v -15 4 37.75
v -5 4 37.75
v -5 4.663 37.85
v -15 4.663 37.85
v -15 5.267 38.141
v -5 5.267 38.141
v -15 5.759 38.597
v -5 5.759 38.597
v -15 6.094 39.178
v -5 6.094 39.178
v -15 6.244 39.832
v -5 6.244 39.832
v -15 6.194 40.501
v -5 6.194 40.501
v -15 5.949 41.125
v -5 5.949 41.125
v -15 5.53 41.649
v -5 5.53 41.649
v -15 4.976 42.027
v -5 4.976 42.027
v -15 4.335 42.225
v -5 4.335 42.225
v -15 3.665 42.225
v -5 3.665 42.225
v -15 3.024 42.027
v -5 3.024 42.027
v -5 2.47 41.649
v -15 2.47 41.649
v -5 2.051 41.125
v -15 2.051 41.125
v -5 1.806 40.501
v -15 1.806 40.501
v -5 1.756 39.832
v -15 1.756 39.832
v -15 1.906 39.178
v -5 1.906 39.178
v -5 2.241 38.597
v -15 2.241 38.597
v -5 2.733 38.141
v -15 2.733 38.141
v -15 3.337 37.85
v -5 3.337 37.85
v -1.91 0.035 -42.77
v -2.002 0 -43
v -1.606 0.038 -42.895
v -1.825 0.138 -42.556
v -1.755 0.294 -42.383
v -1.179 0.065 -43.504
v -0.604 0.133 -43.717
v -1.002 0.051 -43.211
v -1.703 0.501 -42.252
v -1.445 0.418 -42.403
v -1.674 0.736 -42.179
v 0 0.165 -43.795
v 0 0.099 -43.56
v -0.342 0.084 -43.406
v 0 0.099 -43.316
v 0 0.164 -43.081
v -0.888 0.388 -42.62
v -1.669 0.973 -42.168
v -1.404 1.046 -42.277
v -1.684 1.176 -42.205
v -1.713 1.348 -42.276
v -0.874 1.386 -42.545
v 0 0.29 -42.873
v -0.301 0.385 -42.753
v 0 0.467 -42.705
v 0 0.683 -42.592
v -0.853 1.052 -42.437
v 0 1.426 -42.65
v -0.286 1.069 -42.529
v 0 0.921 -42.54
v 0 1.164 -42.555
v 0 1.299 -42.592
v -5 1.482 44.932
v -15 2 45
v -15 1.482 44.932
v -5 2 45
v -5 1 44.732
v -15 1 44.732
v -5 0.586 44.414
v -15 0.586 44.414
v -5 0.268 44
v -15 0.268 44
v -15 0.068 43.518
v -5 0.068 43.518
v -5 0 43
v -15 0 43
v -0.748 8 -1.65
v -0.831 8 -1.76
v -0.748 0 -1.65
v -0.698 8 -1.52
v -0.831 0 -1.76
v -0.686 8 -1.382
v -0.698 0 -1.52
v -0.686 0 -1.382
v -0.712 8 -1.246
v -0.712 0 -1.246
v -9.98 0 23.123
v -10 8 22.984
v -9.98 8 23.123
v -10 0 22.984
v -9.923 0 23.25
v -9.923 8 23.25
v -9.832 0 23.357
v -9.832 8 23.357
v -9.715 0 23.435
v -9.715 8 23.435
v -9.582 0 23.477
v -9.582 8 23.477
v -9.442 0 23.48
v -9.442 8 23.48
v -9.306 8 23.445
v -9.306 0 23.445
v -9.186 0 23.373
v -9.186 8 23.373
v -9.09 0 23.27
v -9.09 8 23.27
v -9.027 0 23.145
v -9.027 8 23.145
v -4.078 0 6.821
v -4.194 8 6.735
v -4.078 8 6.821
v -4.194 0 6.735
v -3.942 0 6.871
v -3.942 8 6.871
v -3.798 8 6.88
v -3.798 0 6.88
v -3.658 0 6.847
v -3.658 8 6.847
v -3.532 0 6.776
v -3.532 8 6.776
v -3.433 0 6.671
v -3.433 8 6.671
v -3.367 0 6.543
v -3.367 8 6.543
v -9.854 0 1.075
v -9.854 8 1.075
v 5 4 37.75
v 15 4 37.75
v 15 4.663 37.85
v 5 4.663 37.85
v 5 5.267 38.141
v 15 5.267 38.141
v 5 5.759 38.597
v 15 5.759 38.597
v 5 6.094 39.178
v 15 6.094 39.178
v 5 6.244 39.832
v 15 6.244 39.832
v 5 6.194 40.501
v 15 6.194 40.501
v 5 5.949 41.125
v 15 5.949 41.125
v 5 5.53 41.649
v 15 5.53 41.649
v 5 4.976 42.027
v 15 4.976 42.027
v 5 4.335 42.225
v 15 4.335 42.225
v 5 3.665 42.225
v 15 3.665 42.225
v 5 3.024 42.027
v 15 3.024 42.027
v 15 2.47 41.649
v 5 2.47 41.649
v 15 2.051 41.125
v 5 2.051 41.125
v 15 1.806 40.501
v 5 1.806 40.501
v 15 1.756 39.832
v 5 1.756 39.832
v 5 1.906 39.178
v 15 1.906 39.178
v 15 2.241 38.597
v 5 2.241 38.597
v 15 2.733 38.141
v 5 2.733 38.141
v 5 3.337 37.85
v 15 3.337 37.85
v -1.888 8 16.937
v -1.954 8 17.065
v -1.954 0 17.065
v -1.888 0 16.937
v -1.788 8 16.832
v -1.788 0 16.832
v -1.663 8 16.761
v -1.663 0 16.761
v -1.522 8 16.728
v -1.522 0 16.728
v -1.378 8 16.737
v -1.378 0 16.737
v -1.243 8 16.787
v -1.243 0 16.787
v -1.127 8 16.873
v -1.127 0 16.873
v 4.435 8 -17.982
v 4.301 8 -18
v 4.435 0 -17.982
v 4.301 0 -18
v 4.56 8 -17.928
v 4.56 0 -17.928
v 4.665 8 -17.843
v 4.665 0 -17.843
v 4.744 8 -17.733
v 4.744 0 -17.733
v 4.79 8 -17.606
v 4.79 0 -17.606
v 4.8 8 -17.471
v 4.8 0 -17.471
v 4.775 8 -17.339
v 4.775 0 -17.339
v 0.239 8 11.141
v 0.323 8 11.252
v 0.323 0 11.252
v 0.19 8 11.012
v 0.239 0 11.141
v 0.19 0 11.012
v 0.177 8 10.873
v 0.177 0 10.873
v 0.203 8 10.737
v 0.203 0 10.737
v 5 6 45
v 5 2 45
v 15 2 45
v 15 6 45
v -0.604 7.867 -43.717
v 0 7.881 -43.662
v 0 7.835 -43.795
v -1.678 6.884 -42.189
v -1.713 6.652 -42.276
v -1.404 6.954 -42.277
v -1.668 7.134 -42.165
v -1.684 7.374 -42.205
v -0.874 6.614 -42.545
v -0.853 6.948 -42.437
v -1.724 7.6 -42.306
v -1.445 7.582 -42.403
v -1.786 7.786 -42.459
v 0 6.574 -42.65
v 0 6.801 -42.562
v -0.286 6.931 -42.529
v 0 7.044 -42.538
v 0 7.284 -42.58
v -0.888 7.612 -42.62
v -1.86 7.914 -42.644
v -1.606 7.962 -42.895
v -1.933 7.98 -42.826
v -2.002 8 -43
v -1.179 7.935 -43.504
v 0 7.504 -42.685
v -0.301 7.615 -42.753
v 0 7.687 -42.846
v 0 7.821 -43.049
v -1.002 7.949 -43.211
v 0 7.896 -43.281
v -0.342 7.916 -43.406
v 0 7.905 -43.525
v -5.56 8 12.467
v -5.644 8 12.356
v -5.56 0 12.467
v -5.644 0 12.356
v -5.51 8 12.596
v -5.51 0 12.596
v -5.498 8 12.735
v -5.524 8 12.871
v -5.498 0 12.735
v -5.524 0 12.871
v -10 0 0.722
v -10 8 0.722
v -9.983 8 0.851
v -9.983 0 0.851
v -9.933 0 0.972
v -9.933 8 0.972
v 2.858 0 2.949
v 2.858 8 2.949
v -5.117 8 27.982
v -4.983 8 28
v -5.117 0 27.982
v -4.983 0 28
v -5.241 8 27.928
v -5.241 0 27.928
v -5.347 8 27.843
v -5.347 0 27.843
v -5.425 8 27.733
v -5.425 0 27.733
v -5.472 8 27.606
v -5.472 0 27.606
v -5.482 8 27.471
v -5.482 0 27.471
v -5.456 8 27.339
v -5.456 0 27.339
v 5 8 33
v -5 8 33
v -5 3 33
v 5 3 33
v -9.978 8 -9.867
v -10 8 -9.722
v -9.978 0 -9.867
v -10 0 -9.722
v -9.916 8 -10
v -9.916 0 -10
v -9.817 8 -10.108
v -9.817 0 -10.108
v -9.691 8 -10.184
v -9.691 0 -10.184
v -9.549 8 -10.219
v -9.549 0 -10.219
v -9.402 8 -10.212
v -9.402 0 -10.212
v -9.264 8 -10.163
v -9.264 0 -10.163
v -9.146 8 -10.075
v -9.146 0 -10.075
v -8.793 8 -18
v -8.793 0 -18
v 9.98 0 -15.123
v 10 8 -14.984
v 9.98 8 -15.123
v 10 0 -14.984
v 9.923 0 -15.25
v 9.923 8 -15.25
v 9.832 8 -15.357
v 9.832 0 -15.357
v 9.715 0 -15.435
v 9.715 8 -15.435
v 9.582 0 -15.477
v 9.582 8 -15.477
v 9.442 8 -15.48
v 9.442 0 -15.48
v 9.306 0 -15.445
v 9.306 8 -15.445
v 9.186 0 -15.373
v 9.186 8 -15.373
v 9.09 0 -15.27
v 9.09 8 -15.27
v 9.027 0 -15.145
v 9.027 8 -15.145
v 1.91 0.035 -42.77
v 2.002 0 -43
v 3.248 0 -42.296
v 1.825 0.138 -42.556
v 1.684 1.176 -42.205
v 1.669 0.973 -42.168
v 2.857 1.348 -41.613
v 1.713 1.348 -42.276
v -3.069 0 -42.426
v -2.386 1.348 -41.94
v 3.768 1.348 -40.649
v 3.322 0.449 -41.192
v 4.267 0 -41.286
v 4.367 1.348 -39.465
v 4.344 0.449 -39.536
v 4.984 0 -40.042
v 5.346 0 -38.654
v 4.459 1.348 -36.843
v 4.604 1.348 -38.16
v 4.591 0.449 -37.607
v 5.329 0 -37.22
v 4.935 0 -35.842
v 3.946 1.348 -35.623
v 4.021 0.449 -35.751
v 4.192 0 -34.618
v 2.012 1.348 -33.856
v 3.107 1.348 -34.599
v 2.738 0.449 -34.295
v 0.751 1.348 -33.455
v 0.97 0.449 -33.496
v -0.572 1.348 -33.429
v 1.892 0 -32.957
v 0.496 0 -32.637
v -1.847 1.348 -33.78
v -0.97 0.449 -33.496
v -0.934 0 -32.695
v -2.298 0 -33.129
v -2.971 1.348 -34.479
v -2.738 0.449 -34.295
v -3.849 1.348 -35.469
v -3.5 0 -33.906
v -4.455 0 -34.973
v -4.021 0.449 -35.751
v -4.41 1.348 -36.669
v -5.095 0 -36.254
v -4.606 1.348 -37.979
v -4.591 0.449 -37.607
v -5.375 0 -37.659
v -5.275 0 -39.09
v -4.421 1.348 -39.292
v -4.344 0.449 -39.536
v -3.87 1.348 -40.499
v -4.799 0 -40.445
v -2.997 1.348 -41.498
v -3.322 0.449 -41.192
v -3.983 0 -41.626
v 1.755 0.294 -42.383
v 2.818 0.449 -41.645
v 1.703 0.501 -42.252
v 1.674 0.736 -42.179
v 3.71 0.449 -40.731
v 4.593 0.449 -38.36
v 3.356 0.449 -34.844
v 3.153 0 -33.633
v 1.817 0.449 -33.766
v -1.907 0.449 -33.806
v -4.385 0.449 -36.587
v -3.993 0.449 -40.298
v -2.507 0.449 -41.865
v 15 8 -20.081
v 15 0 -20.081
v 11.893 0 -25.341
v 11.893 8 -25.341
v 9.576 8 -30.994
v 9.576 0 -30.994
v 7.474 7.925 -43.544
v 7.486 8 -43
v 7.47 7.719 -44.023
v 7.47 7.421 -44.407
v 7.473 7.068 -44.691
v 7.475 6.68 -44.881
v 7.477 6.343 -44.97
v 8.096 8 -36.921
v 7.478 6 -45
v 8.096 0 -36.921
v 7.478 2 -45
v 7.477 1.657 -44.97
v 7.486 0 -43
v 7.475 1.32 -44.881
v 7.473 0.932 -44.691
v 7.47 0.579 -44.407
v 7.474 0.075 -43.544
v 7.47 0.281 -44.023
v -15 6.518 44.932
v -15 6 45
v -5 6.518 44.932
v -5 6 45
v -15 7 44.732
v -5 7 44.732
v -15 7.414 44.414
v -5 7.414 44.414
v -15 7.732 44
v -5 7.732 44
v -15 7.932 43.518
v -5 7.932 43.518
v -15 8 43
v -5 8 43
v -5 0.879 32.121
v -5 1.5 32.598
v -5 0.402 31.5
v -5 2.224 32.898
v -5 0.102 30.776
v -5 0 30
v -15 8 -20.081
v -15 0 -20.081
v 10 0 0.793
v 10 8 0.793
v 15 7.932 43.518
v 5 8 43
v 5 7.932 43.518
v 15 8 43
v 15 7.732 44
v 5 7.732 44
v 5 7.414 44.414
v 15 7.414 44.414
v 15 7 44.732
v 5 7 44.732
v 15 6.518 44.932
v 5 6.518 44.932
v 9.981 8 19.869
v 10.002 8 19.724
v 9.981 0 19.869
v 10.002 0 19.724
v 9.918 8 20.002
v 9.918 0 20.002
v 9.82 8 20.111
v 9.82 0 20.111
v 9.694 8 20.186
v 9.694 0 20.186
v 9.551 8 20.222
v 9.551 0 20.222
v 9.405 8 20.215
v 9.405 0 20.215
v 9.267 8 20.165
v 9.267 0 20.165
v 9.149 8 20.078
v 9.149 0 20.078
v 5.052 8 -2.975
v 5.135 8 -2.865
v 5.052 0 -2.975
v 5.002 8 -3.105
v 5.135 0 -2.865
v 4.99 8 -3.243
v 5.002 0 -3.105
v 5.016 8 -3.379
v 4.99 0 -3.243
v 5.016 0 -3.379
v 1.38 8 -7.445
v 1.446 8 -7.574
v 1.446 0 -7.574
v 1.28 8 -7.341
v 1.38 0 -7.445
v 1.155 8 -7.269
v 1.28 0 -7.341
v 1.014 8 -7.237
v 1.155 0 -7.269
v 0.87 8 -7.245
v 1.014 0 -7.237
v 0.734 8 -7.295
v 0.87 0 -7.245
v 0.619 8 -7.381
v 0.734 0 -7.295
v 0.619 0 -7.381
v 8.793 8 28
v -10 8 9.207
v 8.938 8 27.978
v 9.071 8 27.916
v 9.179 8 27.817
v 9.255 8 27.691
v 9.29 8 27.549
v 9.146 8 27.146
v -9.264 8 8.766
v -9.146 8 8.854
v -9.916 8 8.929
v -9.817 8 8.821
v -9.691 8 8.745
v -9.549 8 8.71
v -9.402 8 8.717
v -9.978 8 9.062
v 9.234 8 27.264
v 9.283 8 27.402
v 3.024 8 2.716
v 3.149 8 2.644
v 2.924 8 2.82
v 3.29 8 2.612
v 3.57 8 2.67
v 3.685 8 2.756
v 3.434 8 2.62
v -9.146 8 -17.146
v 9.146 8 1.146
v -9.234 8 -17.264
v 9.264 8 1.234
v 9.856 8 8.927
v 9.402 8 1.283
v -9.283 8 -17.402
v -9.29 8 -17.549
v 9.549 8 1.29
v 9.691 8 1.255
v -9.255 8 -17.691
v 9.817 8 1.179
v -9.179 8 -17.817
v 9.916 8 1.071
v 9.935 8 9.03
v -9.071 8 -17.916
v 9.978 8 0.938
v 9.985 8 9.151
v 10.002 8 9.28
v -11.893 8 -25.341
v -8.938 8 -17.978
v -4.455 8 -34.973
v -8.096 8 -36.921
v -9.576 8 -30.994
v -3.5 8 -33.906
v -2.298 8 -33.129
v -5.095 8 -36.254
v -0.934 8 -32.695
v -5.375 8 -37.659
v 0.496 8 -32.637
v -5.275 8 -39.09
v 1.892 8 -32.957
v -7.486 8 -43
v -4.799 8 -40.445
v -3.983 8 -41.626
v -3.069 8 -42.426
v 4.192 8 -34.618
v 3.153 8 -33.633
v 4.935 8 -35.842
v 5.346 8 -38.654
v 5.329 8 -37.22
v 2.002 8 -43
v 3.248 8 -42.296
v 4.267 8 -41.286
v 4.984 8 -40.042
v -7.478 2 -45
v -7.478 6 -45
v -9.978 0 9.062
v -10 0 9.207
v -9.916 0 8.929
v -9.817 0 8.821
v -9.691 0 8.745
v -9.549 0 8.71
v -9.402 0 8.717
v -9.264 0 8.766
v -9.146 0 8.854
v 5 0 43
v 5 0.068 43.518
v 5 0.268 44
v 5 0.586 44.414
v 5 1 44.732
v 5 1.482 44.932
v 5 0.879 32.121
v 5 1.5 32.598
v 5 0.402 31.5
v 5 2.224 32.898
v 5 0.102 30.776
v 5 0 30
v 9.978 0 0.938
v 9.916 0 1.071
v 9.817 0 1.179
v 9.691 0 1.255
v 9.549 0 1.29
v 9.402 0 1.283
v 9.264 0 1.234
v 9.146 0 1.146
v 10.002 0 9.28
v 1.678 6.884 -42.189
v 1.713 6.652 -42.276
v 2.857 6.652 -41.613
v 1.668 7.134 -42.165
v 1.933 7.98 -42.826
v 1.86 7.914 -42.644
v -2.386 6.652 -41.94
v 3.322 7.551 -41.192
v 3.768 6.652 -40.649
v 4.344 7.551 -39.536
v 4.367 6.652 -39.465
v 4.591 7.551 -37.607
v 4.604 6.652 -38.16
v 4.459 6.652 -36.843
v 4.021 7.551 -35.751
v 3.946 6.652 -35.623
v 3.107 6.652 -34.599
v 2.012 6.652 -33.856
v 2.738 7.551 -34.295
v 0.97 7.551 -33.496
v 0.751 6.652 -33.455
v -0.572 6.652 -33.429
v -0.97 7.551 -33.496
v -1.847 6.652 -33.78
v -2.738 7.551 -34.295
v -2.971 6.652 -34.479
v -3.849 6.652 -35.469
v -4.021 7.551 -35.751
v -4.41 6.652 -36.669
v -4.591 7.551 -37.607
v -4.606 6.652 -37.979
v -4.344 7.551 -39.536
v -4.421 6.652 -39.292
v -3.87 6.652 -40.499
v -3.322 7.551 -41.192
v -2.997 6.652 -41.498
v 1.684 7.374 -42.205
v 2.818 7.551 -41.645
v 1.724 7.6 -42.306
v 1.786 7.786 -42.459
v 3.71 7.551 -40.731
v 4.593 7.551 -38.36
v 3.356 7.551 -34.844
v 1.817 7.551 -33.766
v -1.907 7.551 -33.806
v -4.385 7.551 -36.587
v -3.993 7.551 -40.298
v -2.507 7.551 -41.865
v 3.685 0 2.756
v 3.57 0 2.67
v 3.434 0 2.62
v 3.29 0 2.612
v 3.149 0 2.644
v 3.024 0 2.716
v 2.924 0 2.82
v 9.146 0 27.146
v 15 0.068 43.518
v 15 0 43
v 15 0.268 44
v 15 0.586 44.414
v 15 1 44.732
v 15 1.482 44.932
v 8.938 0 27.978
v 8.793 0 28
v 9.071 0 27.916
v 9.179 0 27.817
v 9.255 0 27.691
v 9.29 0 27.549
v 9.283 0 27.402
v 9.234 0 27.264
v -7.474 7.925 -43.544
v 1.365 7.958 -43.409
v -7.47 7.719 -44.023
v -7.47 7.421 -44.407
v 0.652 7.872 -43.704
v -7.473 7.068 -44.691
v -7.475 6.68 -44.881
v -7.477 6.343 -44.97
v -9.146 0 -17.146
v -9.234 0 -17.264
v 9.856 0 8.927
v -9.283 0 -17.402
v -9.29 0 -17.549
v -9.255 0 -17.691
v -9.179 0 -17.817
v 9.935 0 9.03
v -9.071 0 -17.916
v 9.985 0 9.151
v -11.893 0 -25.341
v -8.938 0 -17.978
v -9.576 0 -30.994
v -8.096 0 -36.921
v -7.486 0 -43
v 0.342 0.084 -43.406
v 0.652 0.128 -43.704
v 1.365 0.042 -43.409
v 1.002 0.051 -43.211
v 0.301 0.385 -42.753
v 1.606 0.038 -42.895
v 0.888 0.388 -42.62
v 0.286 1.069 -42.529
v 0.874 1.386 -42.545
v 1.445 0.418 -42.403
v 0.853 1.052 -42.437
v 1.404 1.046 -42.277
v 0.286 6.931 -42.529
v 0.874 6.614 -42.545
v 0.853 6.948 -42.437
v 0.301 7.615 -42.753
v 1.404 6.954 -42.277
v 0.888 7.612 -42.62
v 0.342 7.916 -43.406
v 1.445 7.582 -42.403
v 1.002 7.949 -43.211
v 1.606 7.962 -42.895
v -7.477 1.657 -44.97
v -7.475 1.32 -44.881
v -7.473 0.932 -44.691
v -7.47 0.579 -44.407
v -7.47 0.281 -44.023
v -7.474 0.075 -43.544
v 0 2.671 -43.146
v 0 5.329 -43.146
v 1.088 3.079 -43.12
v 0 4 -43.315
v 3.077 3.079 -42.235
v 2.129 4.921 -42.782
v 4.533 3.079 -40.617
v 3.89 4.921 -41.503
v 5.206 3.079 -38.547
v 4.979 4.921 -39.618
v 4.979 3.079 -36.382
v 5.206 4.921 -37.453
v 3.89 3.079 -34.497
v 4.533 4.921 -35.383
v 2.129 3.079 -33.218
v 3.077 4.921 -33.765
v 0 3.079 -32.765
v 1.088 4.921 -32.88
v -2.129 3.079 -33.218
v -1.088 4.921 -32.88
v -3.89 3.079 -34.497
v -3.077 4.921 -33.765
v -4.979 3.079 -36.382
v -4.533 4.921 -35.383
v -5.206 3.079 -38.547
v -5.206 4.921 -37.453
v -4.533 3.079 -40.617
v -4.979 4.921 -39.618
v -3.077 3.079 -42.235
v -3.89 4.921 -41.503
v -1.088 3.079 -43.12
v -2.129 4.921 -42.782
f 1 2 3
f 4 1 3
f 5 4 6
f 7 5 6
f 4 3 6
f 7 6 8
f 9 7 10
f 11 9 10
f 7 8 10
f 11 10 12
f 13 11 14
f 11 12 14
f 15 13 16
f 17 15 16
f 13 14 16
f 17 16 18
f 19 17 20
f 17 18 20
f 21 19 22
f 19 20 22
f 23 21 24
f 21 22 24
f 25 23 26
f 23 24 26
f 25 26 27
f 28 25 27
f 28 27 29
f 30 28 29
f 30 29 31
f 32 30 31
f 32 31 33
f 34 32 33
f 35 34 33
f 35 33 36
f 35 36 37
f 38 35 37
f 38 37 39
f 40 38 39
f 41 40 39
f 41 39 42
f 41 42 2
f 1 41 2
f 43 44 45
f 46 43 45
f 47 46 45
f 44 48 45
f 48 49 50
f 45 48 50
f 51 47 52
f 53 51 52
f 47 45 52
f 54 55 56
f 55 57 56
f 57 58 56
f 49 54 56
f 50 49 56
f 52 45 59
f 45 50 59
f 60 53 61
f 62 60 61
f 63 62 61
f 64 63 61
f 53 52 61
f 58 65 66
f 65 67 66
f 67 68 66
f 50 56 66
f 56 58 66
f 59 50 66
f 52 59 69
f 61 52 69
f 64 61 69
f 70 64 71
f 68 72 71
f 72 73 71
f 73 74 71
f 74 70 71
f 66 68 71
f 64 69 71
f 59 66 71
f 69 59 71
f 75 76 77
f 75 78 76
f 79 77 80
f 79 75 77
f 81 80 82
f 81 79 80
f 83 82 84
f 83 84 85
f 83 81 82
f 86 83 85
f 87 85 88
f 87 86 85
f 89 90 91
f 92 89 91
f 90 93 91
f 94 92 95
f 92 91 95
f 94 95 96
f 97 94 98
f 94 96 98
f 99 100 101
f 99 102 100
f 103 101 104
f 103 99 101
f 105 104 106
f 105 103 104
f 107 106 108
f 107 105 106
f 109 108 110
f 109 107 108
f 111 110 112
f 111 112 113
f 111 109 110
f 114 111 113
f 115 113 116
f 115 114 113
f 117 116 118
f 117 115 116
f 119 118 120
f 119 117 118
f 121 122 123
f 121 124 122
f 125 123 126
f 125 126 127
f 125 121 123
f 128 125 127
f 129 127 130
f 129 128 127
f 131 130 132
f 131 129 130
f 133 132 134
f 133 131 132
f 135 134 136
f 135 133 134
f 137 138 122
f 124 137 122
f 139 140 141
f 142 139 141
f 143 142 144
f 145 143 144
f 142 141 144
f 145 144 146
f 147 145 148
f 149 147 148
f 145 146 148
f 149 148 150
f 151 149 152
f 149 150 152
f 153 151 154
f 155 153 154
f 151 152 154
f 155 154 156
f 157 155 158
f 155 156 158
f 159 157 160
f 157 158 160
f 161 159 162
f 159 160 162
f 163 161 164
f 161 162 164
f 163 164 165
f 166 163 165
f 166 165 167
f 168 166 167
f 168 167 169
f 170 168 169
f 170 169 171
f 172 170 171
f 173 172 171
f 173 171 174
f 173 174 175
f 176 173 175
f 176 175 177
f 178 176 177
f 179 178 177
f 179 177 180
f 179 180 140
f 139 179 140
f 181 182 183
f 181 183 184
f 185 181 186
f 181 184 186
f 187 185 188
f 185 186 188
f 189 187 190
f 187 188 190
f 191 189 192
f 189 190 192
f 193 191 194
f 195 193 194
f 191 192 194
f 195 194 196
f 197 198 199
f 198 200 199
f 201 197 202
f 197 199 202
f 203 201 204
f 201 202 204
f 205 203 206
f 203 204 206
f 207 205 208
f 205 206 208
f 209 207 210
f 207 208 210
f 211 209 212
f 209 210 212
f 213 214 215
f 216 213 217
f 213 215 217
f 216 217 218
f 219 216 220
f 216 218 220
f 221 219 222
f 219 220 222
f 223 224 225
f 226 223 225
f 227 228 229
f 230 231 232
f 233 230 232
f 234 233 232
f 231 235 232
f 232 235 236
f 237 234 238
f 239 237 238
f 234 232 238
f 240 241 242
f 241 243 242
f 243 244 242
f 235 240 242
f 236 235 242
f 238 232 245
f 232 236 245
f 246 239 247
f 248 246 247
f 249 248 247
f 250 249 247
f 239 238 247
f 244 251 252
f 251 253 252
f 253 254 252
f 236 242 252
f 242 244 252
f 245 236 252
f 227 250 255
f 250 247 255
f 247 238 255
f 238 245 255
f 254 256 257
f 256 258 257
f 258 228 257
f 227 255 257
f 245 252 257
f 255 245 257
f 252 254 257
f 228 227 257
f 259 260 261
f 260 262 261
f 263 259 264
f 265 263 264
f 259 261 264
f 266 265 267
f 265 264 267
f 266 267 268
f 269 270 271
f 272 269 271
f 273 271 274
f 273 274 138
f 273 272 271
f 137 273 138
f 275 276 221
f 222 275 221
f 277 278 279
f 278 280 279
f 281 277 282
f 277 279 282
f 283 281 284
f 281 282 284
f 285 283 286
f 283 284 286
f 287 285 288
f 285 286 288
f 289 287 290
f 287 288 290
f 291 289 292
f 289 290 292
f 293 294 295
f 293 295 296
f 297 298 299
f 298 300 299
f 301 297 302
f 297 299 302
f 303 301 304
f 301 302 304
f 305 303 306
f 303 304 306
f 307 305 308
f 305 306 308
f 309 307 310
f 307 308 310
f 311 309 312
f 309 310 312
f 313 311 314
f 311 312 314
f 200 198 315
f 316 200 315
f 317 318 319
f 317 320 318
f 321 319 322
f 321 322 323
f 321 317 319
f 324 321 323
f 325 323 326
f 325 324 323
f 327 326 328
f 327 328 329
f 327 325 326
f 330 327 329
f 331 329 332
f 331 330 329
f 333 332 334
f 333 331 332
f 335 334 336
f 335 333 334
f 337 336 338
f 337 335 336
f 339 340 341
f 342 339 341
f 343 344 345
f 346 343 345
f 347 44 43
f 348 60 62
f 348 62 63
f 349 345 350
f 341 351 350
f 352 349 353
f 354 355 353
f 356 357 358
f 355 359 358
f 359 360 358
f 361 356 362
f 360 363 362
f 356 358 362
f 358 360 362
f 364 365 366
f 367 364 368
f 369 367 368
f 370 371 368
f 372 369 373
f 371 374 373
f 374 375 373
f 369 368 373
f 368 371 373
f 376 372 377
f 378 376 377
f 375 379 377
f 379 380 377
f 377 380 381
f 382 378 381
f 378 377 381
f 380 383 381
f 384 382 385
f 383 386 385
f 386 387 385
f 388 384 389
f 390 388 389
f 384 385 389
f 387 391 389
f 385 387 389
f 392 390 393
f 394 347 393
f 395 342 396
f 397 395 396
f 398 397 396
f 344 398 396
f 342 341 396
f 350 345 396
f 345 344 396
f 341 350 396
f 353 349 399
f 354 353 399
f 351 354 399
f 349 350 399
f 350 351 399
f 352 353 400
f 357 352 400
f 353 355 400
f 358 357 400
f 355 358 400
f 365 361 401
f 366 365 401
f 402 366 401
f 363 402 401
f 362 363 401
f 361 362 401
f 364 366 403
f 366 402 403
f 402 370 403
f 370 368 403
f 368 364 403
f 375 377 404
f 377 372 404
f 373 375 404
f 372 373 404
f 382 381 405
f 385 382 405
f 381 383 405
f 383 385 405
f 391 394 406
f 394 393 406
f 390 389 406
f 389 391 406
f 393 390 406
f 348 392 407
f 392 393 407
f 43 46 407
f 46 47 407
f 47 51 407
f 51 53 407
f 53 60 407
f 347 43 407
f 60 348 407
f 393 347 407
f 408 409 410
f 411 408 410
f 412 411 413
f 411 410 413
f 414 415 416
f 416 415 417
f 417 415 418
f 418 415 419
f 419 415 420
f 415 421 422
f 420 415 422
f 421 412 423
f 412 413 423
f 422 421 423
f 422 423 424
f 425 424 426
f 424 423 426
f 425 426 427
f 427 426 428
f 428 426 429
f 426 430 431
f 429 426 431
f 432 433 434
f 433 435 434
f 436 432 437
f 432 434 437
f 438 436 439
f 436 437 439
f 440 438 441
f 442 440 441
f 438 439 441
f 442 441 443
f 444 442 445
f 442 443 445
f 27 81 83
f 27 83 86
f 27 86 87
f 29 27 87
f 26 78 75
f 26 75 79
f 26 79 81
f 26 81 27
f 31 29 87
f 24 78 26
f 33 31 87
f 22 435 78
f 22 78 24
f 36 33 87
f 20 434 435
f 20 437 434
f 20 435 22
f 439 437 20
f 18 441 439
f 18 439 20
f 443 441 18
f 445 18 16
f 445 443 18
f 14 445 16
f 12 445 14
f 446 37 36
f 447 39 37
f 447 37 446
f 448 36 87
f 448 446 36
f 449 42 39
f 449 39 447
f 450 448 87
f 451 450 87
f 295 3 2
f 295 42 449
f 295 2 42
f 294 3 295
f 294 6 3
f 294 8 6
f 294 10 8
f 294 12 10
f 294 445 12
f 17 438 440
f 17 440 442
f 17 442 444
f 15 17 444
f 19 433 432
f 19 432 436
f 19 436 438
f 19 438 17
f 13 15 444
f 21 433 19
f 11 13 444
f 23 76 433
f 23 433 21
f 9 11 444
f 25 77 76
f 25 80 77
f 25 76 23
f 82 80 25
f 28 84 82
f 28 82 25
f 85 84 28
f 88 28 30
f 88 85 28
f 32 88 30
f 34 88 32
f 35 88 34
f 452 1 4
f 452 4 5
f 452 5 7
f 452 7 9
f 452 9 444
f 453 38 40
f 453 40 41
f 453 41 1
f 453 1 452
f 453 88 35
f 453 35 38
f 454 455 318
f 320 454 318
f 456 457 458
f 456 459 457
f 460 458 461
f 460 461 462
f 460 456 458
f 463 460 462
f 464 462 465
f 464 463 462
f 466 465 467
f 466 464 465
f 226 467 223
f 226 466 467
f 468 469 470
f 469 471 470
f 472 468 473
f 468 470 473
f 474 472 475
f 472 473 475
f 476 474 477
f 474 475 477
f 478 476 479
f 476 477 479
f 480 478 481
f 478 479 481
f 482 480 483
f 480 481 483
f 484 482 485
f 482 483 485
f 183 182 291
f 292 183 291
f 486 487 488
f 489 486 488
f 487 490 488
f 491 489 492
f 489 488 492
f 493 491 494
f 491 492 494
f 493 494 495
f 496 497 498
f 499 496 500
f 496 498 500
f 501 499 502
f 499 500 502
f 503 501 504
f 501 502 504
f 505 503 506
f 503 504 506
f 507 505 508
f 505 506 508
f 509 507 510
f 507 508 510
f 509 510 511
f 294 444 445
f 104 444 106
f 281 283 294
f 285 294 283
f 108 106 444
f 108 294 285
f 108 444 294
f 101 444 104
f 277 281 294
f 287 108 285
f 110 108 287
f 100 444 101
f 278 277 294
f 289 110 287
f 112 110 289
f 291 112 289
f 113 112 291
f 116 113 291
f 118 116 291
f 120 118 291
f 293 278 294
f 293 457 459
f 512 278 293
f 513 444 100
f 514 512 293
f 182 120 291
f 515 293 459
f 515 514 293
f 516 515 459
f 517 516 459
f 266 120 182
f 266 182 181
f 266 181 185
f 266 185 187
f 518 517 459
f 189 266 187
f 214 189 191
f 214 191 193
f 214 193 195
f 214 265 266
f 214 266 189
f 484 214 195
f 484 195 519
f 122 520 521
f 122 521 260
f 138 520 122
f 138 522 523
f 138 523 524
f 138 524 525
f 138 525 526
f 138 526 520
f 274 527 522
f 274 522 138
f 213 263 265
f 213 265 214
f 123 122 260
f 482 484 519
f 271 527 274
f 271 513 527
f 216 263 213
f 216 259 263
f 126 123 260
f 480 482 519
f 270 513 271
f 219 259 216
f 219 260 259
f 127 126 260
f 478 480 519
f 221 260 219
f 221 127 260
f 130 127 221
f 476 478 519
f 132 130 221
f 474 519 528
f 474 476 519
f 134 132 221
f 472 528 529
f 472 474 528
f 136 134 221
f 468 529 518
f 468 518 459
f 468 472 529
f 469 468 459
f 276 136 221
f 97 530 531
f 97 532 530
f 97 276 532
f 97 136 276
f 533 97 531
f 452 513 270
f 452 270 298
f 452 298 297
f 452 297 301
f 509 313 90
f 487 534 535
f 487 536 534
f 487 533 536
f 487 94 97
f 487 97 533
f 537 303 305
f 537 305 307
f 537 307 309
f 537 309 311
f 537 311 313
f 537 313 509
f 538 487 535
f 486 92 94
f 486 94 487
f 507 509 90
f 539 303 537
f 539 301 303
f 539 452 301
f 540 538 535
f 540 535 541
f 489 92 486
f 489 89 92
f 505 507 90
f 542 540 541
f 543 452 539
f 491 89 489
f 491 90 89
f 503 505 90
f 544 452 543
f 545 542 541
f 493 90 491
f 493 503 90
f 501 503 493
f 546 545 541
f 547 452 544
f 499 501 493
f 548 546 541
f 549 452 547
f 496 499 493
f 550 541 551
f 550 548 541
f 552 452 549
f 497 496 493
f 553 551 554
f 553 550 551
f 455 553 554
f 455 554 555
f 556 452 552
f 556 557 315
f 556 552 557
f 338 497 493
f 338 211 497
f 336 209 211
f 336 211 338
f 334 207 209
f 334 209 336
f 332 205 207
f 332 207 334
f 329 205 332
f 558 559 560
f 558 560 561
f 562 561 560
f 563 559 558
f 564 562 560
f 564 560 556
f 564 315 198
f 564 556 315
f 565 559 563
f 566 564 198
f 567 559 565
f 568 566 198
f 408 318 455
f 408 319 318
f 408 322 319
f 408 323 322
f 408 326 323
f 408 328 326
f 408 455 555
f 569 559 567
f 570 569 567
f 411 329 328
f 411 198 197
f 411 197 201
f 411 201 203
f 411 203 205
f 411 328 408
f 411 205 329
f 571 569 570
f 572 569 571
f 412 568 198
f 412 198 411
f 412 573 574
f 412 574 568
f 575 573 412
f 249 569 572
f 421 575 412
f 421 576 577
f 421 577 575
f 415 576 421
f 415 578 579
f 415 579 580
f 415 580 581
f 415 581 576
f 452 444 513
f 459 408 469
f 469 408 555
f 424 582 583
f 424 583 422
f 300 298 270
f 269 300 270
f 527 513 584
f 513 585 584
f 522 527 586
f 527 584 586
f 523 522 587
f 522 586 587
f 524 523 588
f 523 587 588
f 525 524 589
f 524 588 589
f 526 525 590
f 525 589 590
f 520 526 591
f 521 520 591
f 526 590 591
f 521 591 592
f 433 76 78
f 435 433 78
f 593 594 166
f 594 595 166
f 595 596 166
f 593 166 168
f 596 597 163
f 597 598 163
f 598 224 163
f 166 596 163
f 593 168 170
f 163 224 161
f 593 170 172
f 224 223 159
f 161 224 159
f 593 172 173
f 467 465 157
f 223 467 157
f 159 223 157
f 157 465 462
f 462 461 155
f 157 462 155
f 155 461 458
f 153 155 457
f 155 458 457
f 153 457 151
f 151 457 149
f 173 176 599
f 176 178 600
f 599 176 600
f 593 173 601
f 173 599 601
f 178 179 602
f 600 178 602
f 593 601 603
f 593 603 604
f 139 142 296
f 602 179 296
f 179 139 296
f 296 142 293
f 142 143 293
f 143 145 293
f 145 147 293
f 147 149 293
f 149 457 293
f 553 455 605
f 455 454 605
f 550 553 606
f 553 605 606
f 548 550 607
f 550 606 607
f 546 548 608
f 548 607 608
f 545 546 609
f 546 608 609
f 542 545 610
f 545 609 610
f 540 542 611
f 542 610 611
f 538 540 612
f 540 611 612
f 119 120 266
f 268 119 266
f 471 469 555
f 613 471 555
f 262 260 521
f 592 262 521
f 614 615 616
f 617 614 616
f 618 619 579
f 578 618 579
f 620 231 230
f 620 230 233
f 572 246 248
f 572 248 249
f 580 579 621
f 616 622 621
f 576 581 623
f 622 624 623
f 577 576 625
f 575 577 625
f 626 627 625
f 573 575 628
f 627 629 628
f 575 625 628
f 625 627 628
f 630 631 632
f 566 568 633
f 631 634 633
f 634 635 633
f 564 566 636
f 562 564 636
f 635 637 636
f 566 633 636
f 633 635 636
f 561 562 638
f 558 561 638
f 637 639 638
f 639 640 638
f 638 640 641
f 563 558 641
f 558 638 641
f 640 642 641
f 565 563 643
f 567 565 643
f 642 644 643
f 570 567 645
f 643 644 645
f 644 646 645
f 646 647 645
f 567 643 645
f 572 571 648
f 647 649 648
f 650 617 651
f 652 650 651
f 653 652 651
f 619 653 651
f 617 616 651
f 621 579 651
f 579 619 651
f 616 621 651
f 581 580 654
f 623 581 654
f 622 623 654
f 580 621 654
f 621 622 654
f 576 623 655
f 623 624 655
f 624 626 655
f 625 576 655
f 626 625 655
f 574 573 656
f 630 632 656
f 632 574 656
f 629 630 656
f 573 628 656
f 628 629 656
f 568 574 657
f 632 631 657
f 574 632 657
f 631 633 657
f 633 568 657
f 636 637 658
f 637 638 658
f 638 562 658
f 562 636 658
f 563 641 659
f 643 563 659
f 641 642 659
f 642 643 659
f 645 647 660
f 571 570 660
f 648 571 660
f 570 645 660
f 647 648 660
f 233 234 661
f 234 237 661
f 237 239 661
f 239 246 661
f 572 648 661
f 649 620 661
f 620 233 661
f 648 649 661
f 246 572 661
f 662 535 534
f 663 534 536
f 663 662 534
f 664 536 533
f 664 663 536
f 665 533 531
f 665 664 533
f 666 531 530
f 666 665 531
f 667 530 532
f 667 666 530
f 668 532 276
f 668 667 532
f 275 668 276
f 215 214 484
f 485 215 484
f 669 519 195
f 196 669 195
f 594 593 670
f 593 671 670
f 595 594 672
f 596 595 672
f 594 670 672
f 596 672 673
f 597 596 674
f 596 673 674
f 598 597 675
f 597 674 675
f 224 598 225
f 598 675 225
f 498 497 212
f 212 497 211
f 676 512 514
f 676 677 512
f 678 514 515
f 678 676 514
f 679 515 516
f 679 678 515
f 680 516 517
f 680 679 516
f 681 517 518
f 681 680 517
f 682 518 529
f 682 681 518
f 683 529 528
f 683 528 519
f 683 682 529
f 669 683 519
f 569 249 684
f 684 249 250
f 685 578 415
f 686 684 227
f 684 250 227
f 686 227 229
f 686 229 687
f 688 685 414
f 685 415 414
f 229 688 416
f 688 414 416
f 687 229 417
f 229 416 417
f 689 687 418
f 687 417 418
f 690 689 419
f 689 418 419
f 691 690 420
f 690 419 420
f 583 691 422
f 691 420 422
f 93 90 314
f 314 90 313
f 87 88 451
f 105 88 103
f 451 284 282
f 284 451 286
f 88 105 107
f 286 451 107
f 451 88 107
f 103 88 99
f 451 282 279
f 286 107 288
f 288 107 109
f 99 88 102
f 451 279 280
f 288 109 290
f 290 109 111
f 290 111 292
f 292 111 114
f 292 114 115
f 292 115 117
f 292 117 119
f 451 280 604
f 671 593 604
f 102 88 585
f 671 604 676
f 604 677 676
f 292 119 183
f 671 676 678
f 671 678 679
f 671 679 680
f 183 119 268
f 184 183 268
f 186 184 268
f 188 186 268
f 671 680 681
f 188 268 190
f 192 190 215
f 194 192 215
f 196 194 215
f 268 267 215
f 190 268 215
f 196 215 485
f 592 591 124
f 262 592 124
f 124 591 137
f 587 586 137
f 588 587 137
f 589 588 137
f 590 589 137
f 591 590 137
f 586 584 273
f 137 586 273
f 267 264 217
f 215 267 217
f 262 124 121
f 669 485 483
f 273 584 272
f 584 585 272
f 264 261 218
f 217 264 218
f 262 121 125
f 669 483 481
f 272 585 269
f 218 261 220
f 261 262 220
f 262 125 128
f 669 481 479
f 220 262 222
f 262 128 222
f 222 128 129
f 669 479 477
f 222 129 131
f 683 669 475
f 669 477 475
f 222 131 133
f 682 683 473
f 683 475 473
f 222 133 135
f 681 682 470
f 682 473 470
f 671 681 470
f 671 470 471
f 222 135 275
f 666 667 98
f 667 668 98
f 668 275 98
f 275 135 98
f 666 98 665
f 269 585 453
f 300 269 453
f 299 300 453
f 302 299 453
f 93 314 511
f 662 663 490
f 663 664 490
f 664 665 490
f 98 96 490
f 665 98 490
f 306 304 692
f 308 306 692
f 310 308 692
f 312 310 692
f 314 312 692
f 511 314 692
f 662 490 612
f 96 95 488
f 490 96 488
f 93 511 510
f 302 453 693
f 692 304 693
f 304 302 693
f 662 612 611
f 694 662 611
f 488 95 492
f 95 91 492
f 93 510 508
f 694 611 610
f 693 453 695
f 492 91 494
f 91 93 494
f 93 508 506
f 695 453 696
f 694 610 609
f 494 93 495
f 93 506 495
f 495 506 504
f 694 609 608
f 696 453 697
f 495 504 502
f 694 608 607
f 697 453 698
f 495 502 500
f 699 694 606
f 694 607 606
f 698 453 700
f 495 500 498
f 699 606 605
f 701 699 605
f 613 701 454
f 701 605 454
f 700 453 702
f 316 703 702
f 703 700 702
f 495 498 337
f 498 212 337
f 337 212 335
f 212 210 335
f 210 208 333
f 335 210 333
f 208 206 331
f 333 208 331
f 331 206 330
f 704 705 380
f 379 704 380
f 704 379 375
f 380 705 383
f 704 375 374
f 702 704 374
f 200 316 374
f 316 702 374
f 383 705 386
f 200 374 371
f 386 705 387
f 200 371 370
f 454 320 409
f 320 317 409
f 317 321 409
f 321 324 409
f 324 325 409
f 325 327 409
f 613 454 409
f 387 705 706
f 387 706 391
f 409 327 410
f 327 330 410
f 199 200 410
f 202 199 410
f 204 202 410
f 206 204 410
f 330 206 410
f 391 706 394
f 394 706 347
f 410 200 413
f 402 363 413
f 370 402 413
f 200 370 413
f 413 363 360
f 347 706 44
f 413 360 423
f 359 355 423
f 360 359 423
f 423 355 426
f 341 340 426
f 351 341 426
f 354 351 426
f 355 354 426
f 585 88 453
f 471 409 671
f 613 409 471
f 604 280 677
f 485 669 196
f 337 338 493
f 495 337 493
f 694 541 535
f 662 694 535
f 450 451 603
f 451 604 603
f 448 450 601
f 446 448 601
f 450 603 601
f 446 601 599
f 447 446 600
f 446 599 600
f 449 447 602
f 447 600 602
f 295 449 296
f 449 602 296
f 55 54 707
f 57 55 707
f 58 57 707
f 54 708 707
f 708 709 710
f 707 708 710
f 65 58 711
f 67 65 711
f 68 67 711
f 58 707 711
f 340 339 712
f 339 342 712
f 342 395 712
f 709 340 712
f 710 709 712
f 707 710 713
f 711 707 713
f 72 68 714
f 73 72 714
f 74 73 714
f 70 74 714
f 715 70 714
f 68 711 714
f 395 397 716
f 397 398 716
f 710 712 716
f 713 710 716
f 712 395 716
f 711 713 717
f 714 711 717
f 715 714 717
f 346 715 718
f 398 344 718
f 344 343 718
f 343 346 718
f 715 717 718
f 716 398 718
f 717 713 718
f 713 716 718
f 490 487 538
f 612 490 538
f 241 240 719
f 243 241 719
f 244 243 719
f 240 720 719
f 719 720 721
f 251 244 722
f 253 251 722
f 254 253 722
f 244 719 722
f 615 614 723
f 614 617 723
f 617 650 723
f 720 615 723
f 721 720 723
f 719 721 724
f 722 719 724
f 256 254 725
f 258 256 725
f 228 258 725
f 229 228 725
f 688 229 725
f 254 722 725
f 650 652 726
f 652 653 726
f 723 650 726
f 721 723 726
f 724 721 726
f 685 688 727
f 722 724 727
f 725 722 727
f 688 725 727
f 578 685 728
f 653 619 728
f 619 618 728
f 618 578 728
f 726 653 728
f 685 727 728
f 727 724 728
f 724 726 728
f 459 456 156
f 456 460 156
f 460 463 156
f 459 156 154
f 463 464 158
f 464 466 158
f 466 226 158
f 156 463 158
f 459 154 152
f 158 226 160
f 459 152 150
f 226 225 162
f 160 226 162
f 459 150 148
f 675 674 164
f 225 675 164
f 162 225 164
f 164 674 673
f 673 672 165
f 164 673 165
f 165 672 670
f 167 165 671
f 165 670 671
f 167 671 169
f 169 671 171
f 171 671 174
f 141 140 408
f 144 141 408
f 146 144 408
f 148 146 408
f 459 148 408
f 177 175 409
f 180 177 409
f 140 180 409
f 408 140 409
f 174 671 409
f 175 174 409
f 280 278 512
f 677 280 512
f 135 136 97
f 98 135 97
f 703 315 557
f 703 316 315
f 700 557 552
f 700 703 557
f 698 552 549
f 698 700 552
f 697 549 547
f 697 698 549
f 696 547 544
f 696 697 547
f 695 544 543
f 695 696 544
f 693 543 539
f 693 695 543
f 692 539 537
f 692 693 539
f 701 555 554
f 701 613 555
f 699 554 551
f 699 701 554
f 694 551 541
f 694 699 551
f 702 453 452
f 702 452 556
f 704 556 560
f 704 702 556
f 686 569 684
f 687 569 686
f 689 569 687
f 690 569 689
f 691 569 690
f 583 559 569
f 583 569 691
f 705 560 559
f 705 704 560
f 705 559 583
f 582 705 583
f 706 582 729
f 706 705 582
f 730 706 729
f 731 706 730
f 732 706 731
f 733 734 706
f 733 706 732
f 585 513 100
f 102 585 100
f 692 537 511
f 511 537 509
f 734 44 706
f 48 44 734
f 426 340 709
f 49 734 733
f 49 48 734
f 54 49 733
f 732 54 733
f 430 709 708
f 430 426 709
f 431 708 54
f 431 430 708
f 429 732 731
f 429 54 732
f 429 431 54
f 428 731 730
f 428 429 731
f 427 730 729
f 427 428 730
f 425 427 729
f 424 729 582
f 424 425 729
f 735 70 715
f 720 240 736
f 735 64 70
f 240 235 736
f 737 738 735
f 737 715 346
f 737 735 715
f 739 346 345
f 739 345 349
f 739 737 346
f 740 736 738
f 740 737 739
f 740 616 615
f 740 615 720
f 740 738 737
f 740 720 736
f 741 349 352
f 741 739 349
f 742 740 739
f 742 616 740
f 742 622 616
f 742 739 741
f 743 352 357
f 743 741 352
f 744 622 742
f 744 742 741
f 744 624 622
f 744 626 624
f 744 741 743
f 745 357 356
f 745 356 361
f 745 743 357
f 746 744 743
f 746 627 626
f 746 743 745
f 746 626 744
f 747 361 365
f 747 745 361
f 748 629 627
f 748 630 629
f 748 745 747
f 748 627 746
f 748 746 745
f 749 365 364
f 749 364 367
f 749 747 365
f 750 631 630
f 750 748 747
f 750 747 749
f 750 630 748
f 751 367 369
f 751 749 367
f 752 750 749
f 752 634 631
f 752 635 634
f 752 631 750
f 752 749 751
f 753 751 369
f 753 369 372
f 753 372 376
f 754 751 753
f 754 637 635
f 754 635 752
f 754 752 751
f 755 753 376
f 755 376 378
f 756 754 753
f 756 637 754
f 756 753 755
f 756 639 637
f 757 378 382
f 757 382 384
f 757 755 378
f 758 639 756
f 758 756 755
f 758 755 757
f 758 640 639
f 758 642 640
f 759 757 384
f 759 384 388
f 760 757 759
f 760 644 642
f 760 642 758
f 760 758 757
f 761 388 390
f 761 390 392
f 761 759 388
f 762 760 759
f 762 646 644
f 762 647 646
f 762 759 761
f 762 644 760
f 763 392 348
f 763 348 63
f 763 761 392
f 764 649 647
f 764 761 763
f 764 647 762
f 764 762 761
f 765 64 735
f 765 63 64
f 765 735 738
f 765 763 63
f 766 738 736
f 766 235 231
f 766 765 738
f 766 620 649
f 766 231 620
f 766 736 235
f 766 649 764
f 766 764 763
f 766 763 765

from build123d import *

# Parameters (mm, degrees)
SKETCH1_W               = 30
SKETCH1_H               = 90
BOSS_EXTRUDE1_DEPTH     = 8
SKETCH2_W               = 10
SKETCH2_H               = 12
CUT_EXTRUDE1_DEPTH      = 8
SKETCH3_R               = 2.25
CUT_EXTRUDE2_DEPTH      = 55.671747731
FILLET1_R               = 2
CUT_EXTRUDE3_DEPTH      = 49.104053883
FILLET2_R               = 3
FILLET3_R               = 0.9
CUT_EXTRUDE4_DEPTH      = 49.104054025
CUT_EXTRUDE4_DEPTH_BACK = 49.104054025
FILLET4_R               = 0.5


with BuildPart() as part:
    # Sketch1 → Boss-Extrude1 (new body)
    with BuildSketch(Plane(origin=(0, 0, 0), x_dir=(1, 0, 0), z_dir=(0, 1, 0))):
        Rectangle(SKETCH1_W, SKETCH1_H)
    extrude(amount=BOSS_EXTRUDE1_DEPTH)

    # Sketch2 → Cut-Extrude1 (cut)
    with BuildSketch(Plane(origin=(0, 8, 0), x_dir=(1, 0, 0), z_dir=(0, 1, 0))):
        with Locations((0, -39)):
            Rectangle(SKETCH2_W, SKETCH2_H)
    extrude(amount=-CUT_EXTRUDE1_DEPTH, mode=Mode.SUBTRACT)

    # Sketch3 → Cut-Extrude2 (cut, through all)
    with BuildSketch(Plane(origin=(15, 0, 0), x_dir=(0, 0, -1), z_dir=(1, 0, 0))):
        with Locations((-40, 4)):
            Circle(SKETCH3_R)
    extrude(amount=-CUT_EXTRUDE2_DEPTH, mode=Mode.SUBTRACT)

    # Fillet1
    fillet1_edges = [part.edges().sort_by_distance(p)[0] for p in [
        (10, 0, 45),
        (-10, 8, 45),
        (10, 8, 45),
        (-10, 0, 45),
        (0, 0, -45),
        (0, 8, -45),
    ]]
    fillet(fillet1_edges, radius=FILLET1_R)

    # Sketch4 → Cut-Extrude3 (cut, through all)
    with BuildSketch(Plane(origin=(0, 8, 0), x_dir=(1, 0, 0), z_dir=(0, 1, 0))):
        Polygon((5, 18), (-10, 18), (1.186440678, 6.813559322), align=None)
        Polygon((10, -2), (10, 18), (4.915254237, 3.084745763), align=None)
        Polygon((-10, -8), (-10, -26), (-5.423728814, -12.576271186), align=None)
        Polygon((-5.681818182, -28), (10, -28), (-1.694915254, -16.305084746), align=None)
        Polygon((-10, 10.928932188), (-10, -0.928932188), (-3.625999709, -7.302932479), (-0.611288427, 1.540220615), align=None)
        Polygon((10.002308787, -20.931240975), (10.002308787, -9.073376599), (3.117525133, -2.188592944), (0.10281385, -11.031746039), align=None)
    extrude(amount=-CUT_EXTRUDE3_DEPTH, mode=Mode.SUBTRACT)

    # Fillet2
    fillet2_edges = [part.edges().sort_by_distance(p)[0] for p in [
        (0, 0, 33),
    ]]
    fillet(fillet2_edges, radius=FILLET2_R)

    # Sketch5 → Cut-Revolve1 (revolve, cut)
    with BuildSketch(Plane(origin=(0, 0, 0), x_dir=(0, 0, -1), z_dir=(1, 0, 0))):
        with BuildLine():
            Line((41.5, 8), (38, 8))
            Line((38, 8), (38, 0))
            Line((38, 0), (41.5, 0))
            ThreePointArc((41.5, 0), (43.315072906, 4), (41.5, 8))
        make_face()
    revolve(axis=Axis((0, 8, -38), (0, -1, 0)), mode=Mode.SUBTRACT)

    # Fillet3
    fillet3_edges = [part.edges().sort_by_distance(p)[0] for p in [
        (0, 0, -34.5),
        (0, 8, -34.5),
    ]]
    fillet(fillet3_edges, radius=FILLET3_R - 0.0004)  # a hair under: the kernel refuses the full size

    # Sketch6 → Cut-Extrude4 (cut, two sides: drawn at the far end of the back side and taken through both)
    with BuildSketch(Plane(origin=(0, 8, 0), x_dir=(1, 0, 0), z_dir=(0, 1, 0)).offset(-CUT_EXTRUDE4_DEPTH_BACK)):
        with BuildLine():
            Line((-7.477541934, 45), (-15, 45))
            Line((-15, 45), (-15, 20.080818258))
            ThreePointArc((-15, 20.080818258), (-9.275408523, 31.947720661), (-7.477541934, 45))
        make_face()
        with BuildLine():
            Line((15, 45), (15, 20.080818258))
            ThreePointArc((15, 20.080818258), (9.275408523, 31.947720661), (7.477541934, 45))
            Line((7.477541934, 45), (15, 45))
        make_face()
    extrude(amount=CUT_EXTRUDE4_DEPTH + CUT_EXTRUDE4_DEPTH_BACK, mode=Mode.SUBTRACT)

    # Fillet4
    fillet4_edges = [part.edges().sort_by_distance(p)[0] for p in [
        (-10, 4, -10.928932188),
        (-0.611288427, 4, -1.540220615),
        (-3.625999709, 4, 7.302932479),
        (-10, 4, 0.928932188),
        (-1.694915254, 4, 16.305084746),
        (10, 4, 28),
        (-5.681818182, 4, 28),
        (10, 4, 2),
        (4.915254237, 4, -3.084745763),
        (10, 4, -18),
        (-10, 4, 8),
        (-5.423728814, 4, 12.576271186),
        (-10, 4, 26),
        (10.002308787, 4, 20.931240975),
        (0.10281385, 4, 11.031746039),
        (3.117525133, 4, 2.188592944),
        (10.002308787, 4, 9.073376599),
        (5, 4, -18),
        (1.186440678, 4, -6.813559322),
        (-10, 4, -18),
    ]]
    fillet(fillet4_edges, radius=FILLET4_R)


solid = part.part
